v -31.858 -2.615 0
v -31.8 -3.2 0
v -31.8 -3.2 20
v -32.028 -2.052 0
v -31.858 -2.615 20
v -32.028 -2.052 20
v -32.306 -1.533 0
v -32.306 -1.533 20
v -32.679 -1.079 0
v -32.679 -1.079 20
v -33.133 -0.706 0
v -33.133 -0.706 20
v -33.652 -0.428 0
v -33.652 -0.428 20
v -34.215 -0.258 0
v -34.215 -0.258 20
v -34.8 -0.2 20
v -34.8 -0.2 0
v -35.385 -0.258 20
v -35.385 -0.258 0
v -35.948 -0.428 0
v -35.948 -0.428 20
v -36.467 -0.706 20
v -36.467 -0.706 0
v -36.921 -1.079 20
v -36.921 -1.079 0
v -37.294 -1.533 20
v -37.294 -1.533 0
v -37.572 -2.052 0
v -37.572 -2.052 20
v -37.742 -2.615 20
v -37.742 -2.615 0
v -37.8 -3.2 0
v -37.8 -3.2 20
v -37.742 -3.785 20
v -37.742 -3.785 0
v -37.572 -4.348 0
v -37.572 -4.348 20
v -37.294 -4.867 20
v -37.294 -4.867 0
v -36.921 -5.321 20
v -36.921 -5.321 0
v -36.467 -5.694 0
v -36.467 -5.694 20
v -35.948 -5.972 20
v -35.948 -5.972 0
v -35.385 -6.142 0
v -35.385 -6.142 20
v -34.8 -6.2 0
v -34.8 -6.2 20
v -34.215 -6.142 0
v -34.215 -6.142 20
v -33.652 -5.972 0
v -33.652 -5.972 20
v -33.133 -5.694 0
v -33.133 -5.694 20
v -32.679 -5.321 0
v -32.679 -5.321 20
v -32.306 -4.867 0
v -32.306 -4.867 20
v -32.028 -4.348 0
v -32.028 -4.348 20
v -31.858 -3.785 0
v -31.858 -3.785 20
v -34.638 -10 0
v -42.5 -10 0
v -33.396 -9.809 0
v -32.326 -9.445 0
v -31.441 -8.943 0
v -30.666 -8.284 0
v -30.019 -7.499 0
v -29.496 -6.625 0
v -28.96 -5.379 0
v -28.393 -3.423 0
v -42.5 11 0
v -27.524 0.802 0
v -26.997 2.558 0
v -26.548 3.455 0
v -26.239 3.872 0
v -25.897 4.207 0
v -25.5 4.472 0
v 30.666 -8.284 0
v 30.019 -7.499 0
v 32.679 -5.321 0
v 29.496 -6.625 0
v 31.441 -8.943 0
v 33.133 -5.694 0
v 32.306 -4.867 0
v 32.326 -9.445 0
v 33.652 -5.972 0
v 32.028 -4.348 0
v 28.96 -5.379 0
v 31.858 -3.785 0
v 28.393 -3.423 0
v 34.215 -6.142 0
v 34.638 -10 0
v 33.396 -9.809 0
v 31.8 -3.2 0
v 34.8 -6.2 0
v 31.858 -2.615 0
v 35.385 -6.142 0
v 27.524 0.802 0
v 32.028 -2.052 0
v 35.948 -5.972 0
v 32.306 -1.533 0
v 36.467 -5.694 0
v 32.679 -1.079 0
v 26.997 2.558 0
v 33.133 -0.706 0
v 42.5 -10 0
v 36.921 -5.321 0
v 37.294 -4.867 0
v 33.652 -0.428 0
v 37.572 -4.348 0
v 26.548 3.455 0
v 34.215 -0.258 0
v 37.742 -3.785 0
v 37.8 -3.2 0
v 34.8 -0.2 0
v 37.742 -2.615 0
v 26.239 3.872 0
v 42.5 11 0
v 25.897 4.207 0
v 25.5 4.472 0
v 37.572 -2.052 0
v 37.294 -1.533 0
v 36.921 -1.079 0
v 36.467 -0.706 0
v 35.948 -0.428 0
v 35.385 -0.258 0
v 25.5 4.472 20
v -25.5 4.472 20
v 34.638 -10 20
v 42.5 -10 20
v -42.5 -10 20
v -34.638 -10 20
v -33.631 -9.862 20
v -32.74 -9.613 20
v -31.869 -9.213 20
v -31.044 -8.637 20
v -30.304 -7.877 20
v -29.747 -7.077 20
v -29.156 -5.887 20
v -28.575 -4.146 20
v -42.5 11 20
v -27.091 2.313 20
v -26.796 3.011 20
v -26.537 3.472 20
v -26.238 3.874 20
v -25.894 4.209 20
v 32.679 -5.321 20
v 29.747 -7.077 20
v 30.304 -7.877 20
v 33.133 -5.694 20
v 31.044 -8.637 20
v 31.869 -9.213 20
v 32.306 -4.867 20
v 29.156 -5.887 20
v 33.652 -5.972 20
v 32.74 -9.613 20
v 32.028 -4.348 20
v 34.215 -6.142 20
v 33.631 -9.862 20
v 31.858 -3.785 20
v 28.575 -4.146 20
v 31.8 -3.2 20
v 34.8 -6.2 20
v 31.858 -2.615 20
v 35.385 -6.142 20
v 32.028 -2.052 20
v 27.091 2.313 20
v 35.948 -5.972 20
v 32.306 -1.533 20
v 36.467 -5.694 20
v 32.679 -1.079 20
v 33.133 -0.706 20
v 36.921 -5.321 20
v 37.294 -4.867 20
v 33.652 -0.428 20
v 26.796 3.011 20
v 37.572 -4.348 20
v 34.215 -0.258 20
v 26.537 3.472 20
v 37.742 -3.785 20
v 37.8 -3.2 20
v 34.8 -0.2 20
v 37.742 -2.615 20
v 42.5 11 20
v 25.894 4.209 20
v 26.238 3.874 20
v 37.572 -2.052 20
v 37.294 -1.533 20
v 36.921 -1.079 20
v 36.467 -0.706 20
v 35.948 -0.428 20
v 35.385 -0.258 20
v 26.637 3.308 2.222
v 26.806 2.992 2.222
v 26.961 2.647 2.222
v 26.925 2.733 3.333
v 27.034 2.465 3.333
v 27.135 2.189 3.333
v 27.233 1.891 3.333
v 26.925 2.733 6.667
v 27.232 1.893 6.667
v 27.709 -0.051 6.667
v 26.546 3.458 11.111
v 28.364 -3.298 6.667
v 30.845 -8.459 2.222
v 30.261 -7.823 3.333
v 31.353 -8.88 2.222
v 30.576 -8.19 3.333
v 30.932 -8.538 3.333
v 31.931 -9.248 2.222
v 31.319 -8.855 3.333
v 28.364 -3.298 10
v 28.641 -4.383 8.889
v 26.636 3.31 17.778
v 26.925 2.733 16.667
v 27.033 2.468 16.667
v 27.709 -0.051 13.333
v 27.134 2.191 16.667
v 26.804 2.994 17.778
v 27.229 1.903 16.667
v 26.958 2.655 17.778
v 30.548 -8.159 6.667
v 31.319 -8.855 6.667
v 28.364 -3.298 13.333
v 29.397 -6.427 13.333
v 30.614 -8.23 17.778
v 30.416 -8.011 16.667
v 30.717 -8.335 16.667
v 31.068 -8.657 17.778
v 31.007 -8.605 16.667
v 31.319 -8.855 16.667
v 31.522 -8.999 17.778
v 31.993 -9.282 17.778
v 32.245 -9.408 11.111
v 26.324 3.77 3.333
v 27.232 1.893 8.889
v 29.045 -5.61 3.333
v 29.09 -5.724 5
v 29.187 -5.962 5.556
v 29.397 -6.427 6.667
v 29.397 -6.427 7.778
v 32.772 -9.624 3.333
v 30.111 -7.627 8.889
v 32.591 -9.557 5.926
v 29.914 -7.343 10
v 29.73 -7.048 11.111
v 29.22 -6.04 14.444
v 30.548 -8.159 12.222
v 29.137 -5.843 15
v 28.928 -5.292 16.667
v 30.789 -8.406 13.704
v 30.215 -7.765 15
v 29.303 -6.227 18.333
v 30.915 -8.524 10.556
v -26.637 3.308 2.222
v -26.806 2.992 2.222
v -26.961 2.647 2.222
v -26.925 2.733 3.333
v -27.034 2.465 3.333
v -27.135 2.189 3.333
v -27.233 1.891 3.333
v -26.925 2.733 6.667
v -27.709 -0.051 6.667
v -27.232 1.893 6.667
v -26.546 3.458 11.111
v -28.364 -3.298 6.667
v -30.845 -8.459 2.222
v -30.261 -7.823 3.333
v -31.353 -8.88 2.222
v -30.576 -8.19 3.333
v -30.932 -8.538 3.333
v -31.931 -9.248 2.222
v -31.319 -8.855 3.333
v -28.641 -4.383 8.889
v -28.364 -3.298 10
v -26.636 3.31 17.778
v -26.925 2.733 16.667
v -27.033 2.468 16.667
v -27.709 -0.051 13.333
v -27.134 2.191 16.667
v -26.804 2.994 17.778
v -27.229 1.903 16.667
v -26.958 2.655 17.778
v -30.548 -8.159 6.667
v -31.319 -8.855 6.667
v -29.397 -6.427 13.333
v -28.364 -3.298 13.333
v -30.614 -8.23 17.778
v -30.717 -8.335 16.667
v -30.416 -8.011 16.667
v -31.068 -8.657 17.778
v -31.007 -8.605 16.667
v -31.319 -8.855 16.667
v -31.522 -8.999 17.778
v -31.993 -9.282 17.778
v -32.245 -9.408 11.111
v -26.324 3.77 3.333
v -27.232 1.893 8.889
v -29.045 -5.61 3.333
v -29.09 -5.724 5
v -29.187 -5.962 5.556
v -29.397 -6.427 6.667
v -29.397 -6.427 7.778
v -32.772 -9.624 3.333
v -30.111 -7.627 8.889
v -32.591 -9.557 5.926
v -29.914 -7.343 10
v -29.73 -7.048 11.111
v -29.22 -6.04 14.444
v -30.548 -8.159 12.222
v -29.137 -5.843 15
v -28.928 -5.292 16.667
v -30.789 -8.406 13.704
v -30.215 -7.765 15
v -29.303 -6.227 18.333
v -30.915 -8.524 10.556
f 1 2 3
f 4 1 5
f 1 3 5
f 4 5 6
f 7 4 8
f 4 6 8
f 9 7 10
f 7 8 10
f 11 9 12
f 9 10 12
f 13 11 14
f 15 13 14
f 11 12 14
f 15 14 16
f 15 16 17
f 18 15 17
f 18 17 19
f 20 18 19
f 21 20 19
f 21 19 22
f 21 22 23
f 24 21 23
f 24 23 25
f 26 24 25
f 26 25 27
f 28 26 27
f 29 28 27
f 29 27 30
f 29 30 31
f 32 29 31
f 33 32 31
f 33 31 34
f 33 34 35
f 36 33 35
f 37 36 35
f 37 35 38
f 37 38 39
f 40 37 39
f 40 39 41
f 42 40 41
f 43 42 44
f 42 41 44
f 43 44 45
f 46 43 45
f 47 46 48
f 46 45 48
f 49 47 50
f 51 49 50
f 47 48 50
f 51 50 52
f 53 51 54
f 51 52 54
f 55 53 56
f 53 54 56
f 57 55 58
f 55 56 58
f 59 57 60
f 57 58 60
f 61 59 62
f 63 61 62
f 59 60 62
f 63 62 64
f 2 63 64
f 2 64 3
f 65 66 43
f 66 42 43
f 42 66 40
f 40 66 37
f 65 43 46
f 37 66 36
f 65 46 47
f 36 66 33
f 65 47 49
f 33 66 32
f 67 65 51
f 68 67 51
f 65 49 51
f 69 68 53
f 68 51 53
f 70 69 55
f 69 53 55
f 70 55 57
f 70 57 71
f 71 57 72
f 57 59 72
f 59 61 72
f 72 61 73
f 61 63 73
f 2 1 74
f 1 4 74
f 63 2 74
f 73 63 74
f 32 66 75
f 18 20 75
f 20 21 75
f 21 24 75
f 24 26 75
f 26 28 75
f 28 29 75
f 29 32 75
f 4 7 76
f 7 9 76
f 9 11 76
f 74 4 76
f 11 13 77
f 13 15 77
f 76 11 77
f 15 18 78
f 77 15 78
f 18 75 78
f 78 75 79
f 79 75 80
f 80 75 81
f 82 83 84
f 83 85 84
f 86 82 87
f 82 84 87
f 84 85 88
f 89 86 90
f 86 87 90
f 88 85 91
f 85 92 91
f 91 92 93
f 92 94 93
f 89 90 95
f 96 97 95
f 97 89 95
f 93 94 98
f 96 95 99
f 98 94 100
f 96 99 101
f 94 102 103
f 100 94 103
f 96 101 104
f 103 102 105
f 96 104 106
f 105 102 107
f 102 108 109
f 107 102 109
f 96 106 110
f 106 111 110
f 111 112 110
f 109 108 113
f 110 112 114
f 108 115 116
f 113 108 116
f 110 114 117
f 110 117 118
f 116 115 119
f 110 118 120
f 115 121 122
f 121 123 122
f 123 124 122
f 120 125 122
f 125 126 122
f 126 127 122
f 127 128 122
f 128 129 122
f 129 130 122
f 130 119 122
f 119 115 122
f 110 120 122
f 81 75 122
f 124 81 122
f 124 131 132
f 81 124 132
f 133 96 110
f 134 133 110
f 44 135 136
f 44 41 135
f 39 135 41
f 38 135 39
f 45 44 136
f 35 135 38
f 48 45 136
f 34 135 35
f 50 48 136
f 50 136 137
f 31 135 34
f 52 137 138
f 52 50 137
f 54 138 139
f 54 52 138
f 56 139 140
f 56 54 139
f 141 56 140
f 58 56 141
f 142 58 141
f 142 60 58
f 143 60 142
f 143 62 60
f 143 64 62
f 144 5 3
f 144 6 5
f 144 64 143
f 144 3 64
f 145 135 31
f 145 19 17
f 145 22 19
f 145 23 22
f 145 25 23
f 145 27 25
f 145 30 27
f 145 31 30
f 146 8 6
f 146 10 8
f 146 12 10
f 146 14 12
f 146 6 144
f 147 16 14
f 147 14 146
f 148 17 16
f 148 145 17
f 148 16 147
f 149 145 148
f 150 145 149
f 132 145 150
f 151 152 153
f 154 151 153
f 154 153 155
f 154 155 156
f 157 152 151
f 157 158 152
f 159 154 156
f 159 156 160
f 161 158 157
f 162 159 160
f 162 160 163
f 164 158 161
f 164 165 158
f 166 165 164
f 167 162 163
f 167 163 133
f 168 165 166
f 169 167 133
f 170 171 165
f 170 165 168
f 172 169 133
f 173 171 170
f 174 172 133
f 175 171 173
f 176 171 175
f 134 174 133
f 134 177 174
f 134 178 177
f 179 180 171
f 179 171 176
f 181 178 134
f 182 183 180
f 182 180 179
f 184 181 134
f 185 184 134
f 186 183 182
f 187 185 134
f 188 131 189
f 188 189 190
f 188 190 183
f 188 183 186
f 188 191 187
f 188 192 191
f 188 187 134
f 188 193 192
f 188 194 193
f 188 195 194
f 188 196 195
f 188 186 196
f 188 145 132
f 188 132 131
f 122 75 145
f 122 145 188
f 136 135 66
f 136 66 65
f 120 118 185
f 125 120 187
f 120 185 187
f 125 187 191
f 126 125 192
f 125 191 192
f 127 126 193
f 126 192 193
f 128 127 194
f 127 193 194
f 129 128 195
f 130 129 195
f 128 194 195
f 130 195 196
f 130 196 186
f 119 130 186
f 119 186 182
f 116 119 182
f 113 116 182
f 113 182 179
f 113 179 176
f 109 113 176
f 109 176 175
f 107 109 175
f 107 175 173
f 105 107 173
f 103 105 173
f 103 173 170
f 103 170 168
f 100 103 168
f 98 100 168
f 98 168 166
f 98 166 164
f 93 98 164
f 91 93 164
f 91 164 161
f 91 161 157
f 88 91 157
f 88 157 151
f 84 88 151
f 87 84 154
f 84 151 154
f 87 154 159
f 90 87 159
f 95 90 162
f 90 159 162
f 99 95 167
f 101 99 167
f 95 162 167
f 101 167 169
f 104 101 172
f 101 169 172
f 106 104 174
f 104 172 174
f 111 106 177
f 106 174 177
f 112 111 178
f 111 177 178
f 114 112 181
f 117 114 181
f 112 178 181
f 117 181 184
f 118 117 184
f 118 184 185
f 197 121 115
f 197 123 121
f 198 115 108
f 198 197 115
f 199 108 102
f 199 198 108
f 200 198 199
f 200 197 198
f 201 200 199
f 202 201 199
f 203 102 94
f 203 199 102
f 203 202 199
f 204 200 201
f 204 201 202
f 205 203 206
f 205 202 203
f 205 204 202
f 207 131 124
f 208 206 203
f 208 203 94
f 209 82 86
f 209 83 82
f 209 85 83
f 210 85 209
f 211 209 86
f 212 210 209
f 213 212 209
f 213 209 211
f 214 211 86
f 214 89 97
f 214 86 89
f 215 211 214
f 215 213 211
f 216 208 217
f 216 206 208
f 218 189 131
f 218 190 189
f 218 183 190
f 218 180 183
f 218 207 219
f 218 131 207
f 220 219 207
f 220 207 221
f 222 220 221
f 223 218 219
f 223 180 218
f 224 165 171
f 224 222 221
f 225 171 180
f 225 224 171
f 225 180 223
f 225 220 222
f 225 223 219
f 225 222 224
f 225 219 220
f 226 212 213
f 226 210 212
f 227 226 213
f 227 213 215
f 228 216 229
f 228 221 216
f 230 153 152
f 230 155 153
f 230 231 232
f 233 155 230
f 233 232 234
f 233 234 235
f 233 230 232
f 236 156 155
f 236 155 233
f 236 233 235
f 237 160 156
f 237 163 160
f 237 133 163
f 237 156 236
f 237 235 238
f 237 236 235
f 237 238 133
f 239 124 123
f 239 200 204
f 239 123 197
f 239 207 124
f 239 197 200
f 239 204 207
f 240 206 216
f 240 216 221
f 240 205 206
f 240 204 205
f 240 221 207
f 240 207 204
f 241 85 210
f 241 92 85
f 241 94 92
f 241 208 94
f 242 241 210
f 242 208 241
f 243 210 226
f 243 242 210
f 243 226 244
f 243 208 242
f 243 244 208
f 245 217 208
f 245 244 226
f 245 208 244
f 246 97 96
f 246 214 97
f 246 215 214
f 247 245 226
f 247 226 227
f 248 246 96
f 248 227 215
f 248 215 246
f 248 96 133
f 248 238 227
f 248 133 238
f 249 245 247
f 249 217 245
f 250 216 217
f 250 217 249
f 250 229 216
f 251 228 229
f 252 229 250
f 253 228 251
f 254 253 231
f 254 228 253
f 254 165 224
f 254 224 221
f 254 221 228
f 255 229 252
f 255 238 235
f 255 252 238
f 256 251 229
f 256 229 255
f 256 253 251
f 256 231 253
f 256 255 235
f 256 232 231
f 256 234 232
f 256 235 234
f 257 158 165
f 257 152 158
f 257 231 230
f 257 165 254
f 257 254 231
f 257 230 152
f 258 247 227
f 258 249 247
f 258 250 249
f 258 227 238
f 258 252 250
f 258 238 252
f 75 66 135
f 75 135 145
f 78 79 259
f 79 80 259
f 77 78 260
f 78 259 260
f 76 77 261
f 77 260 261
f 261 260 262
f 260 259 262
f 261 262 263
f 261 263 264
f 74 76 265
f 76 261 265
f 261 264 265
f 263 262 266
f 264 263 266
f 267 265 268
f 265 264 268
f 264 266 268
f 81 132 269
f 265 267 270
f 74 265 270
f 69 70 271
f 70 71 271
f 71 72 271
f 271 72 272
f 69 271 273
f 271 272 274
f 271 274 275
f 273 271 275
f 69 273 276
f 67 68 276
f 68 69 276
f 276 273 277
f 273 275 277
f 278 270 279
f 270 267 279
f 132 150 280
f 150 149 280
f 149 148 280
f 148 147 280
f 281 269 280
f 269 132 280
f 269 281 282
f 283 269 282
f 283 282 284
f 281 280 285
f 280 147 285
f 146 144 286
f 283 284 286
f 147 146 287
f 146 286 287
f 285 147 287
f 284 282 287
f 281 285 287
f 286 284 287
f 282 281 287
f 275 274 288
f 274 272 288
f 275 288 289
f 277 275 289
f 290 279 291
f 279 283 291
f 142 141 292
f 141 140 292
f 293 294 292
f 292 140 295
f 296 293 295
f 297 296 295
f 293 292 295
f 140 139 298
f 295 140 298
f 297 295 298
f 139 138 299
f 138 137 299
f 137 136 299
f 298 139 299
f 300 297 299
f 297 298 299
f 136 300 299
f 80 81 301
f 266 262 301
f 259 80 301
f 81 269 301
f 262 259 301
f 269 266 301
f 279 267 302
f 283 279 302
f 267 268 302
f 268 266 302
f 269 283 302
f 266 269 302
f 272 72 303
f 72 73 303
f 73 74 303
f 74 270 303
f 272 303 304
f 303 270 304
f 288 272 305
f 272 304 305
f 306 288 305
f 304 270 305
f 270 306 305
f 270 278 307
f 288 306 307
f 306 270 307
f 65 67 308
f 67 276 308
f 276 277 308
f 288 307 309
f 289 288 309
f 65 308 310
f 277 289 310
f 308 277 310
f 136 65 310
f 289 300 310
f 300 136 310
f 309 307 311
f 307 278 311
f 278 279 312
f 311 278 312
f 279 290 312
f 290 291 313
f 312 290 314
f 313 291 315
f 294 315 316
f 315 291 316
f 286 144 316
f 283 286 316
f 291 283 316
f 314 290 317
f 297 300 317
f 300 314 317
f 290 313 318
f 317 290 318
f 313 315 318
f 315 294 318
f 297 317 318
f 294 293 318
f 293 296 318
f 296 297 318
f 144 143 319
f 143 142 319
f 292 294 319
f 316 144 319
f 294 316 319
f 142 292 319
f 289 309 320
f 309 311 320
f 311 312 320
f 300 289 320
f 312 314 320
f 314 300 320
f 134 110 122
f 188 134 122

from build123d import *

# Parameters (mm, degrees)
SKETCH_3_W          = 85
SKETCH_3_H          = 21
EXTRUDE_2_DEPTH     = 20
SKETCH_4_R          = 3
CUT_EXTRUDE_2_DEPTH = 49.241579576
CUT_EXTRUDE_3_DEPTH = 49.241579576


with BuildPart() as part:
    # Эскиз3 → Вытянуть2 (new body)
    with BuildSketch(Plane.XY):
        with Locations((0, 0.5)):
            Rectangle(SKETCH_3_W, SKETCH_3_H)
    extrude(amount=EXTRUDE_2_DEPTH)

    # Эскиз4 → Вырез-Вытянуть2 (cut, through all)
    with BuildSketch(Plane.XY.offset(20)):
        with Locations((-34.8, -3.2)):
            Circle(SKETCH_4_R)
        with Locations((34.8, -3.2)):
            Circle(SKETCH_4_R)
    extrude(amount=-CUT_EXTRUDE_2_DEPTH, mode=Mode.SUBTRACT)

    # Эскиз6 → Вырез-Вытянуть3 (cut, through all)
    with BuildSketch(Plane.XY.offset(20)):
        with BuildLine():
            Line((-34.63787593, -10), (34.63787593, -10))
            add(Edge.make_bspline(
                [(25.5, 4.472396239), (29.328176933, 2.427539869), (26.262862424, -9.380662075), (34.63787593, -10)],
                knots=[0, 0, 0, 0, 1, 1, 1, 1], degree=3))
            Line((25.5, 4.472396239), (-25.5, 4.472396239))
            add(Edge.make_bspline(
                [(-25.5, 4.472396239), (-29.328176933, 2.427539869), (-26.262862424, -9.380662075), (-34.63787593, -10)],
                knots=[0, 0, 0, 0, 1, 1, 1, 1], degree=3))
        make_face()
    extrude(amount=-CUT_EXTRUDE_3_DEPTH, mode=Mode.SUBTRACT)


solid = part.part
